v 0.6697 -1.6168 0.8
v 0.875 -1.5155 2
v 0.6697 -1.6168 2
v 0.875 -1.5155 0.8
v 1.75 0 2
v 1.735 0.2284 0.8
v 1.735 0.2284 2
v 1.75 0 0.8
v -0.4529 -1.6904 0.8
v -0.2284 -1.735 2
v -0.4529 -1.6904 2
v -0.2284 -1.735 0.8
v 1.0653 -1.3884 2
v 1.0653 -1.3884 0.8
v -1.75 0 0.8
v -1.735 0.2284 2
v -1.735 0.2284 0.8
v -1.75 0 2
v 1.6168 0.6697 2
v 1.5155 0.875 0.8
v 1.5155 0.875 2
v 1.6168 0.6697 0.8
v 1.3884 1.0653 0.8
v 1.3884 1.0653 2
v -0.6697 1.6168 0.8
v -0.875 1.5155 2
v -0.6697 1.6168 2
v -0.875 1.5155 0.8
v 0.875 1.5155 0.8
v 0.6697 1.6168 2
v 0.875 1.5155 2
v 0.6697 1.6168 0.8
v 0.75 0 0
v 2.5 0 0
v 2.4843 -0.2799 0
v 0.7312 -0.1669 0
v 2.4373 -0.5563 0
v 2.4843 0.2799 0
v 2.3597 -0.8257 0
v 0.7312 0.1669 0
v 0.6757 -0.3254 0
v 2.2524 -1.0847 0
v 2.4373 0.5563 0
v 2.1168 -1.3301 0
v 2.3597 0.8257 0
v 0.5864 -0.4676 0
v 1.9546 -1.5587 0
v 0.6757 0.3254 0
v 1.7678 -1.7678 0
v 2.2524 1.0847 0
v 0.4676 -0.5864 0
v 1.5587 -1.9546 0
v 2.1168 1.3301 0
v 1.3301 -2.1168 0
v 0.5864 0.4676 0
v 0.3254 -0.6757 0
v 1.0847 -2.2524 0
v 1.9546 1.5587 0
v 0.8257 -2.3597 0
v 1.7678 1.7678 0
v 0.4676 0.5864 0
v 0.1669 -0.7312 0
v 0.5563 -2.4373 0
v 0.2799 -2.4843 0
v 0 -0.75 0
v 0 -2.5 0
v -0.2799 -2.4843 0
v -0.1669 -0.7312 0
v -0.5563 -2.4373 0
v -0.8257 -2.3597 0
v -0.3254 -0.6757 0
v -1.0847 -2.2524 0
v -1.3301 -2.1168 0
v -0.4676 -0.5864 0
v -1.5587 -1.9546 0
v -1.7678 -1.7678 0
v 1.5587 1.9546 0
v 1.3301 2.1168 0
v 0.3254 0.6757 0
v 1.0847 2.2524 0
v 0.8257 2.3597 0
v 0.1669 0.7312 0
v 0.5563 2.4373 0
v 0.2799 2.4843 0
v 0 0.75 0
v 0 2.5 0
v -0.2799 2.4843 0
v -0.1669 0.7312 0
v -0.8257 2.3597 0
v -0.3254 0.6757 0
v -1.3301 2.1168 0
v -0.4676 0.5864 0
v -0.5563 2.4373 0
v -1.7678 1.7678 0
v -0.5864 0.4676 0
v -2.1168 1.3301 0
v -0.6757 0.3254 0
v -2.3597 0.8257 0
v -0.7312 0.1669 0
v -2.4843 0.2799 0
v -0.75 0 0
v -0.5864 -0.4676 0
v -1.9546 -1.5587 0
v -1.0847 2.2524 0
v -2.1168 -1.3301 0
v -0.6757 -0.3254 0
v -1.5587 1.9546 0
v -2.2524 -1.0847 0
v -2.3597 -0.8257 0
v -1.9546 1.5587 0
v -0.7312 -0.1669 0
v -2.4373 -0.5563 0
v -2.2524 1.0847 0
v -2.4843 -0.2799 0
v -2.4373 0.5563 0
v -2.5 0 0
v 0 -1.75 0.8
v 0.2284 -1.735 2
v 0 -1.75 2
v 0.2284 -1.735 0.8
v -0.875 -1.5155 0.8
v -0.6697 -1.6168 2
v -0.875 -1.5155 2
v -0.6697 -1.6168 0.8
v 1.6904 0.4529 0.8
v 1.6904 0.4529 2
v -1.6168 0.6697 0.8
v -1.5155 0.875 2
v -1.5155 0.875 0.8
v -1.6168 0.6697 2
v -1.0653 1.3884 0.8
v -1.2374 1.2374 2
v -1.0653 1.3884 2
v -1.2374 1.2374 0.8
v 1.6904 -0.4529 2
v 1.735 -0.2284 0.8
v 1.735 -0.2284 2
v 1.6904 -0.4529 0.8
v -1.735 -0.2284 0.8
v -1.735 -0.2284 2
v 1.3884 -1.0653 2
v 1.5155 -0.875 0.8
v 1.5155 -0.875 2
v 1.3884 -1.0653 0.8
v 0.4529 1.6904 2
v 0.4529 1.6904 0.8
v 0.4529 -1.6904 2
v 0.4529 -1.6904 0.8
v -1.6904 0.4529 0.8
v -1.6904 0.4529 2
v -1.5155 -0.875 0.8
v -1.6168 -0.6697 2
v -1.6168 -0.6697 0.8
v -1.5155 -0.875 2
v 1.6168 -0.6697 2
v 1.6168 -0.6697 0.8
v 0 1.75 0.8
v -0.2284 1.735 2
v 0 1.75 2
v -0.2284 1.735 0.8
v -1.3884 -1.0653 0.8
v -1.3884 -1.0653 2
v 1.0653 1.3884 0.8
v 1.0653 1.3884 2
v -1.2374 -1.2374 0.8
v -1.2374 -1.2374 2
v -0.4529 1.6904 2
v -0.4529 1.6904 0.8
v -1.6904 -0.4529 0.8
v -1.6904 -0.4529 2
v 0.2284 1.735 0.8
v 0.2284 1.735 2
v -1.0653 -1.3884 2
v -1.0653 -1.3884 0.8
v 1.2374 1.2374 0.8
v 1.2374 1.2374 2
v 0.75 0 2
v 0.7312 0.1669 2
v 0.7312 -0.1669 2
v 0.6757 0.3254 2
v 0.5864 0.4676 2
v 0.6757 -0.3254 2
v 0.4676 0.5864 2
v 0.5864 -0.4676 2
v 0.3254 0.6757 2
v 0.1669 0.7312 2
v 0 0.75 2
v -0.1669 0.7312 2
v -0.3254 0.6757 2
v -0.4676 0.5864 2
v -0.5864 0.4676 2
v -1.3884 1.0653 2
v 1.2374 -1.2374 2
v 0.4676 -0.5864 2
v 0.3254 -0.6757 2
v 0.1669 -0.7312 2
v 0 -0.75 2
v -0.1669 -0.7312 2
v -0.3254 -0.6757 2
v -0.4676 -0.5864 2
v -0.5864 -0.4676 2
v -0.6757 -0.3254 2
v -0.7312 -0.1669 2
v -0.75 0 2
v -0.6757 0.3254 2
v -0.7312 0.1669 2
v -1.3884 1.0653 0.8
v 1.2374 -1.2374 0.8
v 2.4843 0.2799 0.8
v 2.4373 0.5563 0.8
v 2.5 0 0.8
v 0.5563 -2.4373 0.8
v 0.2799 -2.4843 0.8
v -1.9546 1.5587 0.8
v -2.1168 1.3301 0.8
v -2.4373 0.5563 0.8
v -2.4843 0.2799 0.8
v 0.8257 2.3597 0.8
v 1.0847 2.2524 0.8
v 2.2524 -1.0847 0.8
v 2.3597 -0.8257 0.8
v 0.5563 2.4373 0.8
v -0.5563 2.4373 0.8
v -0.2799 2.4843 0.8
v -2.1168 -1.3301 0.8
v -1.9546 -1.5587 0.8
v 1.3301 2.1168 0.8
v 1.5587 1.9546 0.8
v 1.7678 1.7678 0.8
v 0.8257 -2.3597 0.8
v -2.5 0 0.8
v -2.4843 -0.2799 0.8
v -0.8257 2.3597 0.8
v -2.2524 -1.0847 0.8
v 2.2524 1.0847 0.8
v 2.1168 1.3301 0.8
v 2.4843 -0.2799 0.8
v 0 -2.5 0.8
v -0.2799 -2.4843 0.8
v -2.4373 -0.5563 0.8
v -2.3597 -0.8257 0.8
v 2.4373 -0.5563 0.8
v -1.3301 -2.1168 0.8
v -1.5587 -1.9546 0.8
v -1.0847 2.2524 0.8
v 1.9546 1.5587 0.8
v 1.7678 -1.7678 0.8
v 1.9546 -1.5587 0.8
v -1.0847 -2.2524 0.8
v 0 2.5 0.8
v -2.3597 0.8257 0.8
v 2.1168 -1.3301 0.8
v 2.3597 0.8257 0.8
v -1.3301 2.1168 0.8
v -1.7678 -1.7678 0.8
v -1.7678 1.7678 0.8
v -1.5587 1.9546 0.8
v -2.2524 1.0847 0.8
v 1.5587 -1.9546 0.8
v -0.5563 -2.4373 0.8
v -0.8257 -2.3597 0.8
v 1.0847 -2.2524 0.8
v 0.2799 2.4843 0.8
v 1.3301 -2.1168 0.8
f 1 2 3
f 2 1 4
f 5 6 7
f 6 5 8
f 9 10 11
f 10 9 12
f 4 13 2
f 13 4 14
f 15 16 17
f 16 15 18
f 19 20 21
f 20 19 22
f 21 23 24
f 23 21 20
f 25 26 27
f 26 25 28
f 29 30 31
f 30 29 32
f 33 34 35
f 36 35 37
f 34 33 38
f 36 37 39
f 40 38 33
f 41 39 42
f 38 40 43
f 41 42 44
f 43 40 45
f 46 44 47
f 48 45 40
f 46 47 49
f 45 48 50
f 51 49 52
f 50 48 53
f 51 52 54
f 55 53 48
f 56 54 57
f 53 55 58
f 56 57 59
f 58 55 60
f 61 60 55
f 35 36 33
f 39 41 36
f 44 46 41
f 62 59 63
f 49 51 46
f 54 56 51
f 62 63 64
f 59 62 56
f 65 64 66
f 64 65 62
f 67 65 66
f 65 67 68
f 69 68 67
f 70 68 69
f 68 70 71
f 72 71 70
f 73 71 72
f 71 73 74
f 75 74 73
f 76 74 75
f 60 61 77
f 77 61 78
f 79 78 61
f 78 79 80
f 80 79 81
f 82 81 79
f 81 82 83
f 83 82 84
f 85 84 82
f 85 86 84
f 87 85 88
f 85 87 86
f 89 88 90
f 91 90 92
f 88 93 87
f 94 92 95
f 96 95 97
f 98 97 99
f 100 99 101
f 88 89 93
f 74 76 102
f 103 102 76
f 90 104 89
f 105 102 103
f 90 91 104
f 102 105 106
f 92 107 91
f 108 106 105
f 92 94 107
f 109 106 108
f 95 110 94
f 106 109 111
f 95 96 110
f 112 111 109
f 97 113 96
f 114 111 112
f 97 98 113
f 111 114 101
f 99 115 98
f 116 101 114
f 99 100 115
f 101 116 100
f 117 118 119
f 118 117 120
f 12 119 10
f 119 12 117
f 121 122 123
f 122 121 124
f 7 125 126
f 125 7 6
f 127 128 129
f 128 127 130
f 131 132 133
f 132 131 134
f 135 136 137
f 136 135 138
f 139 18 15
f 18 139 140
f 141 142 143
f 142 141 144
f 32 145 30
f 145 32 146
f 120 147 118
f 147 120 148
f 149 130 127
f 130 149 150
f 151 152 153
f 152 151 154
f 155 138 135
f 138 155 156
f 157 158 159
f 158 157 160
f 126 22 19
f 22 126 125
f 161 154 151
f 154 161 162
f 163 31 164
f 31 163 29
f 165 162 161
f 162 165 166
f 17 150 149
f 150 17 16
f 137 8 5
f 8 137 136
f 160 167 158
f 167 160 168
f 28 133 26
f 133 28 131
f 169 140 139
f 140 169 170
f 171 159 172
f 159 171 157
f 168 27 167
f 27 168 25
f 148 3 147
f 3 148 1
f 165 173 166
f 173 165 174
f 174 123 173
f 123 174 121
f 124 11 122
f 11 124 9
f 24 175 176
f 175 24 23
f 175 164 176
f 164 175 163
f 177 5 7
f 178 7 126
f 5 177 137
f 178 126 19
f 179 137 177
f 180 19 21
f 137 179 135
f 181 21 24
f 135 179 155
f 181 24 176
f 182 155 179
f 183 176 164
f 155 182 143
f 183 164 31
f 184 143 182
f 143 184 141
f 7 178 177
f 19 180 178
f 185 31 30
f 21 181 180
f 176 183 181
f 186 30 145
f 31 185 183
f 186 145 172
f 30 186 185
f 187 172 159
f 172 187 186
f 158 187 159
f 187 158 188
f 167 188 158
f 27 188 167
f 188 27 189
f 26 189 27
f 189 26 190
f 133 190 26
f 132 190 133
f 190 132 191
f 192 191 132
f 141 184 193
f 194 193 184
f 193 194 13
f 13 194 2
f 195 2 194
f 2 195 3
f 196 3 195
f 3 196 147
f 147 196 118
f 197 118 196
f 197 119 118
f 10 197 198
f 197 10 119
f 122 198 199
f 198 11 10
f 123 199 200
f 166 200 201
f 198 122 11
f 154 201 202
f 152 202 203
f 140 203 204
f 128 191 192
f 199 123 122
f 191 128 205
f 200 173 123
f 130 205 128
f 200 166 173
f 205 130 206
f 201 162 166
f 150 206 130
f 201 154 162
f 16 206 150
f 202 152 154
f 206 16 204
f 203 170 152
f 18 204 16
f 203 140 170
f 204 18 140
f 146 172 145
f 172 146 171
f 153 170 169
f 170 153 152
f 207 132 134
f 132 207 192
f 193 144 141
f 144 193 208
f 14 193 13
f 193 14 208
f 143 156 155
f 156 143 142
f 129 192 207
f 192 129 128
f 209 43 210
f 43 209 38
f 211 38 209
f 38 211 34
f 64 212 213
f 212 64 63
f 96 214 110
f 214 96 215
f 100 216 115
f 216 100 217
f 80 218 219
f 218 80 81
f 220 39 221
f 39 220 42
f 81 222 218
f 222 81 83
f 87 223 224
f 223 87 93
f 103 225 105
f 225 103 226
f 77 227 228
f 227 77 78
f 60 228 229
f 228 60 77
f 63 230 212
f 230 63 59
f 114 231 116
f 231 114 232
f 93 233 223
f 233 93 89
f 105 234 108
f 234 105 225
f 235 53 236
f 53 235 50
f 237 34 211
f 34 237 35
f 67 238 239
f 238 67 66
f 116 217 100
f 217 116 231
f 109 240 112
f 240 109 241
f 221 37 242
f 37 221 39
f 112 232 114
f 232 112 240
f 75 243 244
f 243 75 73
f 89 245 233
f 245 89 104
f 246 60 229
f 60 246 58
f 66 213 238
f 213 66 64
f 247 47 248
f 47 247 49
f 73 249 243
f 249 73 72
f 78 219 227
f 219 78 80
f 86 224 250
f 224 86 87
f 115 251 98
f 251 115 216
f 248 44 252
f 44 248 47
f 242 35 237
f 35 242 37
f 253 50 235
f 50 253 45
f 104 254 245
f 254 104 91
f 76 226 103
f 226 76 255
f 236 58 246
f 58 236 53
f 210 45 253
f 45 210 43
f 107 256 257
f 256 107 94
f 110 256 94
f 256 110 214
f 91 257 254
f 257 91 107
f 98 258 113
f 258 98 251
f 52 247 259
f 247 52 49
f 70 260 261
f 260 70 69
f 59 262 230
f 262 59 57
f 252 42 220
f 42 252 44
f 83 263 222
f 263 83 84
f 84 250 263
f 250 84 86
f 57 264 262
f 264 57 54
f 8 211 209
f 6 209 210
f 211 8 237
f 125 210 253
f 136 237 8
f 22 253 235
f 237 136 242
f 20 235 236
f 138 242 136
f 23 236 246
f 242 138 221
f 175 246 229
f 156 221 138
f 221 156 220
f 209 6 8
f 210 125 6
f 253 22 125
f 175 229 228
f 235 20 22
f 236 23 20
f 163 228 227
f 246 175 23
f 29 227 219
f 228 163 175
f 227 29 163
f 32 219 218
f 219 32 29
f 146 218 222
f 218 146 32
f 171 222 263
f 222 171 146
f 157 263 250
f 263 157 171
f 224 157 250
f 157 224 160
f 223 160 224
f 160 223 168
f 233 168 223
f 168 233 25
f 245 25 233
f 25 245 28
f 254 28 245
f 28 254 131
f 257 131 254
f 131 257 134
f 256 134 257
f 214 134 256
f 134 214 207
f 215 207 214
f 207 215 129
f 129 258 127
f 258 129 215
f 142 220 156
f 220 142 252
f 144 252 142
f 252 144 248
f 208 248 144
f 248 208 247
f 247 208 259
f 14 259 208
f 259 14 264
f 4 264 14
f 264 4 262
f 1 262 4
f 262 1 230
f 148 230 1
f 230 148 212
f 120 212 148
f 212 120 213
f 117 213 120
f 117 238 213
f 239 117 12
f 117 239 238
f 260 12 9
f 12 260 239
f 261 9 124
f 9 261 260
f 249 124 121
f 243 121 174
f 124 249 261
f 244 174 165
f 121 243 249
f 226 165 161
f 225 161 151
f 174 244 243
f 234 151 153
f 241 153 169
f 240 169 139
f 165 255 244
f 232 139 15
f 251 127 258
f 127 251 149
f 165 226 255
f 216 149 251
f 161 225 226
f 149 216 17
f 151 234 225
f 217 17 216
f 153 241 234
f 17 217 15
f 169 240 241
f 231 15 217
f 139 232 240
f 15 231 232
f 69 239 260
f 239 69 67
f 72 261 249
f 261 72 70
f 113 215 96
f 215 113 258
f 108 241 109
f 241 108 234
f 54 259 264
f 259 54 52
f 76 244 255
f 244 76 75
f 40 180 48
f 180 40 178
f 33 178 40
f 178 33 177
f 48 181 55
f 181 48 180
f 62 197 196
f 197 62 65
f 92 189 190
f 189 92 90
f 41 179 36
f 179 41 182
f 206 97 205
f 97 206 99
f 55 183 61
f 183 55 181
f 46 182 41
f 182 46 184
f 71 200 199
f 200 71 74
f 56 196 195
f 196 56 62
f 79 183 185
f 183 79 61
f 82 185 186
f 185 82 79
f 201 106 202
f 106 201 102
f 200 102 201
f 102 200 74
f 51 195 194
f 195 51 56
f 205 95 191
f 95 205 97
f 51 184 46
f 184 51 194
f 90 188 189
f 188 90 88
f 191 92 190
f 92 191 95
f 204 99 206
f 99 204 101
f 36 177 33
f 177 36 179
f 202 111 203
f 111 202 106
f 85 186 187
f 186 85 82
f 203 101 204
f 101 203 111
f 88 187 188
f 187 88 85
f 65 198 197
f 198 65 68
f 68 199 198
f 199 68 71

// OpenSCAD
// part_id: cp6
// name: Small bush
// source_drawing_ids: DRW-005
// units: mm
// revision: 0.1
// SPDX-License-Identifier: MIT

module part_cp6(od = 3.5, id = 1.5, th = 2.0, lip_d = 5.0, lip_th = 0.8) {
    difference() {
        union() {
            cylinder(d = od, h = th, center = false, $fn = 48);
            cylinder(d = lip_d, h = lip_th, center = false, $fn = 56);
        }
        translate([0, 0, -0.1]) cylinder(d = id, h = th + 0.2, center = false, $fn = 28);
    }
}

// ---- "main guard" ----
// Default to previewing when opened directly:
if (is_undef(__LIB_MODE__)) {
    part_cp6();
}
